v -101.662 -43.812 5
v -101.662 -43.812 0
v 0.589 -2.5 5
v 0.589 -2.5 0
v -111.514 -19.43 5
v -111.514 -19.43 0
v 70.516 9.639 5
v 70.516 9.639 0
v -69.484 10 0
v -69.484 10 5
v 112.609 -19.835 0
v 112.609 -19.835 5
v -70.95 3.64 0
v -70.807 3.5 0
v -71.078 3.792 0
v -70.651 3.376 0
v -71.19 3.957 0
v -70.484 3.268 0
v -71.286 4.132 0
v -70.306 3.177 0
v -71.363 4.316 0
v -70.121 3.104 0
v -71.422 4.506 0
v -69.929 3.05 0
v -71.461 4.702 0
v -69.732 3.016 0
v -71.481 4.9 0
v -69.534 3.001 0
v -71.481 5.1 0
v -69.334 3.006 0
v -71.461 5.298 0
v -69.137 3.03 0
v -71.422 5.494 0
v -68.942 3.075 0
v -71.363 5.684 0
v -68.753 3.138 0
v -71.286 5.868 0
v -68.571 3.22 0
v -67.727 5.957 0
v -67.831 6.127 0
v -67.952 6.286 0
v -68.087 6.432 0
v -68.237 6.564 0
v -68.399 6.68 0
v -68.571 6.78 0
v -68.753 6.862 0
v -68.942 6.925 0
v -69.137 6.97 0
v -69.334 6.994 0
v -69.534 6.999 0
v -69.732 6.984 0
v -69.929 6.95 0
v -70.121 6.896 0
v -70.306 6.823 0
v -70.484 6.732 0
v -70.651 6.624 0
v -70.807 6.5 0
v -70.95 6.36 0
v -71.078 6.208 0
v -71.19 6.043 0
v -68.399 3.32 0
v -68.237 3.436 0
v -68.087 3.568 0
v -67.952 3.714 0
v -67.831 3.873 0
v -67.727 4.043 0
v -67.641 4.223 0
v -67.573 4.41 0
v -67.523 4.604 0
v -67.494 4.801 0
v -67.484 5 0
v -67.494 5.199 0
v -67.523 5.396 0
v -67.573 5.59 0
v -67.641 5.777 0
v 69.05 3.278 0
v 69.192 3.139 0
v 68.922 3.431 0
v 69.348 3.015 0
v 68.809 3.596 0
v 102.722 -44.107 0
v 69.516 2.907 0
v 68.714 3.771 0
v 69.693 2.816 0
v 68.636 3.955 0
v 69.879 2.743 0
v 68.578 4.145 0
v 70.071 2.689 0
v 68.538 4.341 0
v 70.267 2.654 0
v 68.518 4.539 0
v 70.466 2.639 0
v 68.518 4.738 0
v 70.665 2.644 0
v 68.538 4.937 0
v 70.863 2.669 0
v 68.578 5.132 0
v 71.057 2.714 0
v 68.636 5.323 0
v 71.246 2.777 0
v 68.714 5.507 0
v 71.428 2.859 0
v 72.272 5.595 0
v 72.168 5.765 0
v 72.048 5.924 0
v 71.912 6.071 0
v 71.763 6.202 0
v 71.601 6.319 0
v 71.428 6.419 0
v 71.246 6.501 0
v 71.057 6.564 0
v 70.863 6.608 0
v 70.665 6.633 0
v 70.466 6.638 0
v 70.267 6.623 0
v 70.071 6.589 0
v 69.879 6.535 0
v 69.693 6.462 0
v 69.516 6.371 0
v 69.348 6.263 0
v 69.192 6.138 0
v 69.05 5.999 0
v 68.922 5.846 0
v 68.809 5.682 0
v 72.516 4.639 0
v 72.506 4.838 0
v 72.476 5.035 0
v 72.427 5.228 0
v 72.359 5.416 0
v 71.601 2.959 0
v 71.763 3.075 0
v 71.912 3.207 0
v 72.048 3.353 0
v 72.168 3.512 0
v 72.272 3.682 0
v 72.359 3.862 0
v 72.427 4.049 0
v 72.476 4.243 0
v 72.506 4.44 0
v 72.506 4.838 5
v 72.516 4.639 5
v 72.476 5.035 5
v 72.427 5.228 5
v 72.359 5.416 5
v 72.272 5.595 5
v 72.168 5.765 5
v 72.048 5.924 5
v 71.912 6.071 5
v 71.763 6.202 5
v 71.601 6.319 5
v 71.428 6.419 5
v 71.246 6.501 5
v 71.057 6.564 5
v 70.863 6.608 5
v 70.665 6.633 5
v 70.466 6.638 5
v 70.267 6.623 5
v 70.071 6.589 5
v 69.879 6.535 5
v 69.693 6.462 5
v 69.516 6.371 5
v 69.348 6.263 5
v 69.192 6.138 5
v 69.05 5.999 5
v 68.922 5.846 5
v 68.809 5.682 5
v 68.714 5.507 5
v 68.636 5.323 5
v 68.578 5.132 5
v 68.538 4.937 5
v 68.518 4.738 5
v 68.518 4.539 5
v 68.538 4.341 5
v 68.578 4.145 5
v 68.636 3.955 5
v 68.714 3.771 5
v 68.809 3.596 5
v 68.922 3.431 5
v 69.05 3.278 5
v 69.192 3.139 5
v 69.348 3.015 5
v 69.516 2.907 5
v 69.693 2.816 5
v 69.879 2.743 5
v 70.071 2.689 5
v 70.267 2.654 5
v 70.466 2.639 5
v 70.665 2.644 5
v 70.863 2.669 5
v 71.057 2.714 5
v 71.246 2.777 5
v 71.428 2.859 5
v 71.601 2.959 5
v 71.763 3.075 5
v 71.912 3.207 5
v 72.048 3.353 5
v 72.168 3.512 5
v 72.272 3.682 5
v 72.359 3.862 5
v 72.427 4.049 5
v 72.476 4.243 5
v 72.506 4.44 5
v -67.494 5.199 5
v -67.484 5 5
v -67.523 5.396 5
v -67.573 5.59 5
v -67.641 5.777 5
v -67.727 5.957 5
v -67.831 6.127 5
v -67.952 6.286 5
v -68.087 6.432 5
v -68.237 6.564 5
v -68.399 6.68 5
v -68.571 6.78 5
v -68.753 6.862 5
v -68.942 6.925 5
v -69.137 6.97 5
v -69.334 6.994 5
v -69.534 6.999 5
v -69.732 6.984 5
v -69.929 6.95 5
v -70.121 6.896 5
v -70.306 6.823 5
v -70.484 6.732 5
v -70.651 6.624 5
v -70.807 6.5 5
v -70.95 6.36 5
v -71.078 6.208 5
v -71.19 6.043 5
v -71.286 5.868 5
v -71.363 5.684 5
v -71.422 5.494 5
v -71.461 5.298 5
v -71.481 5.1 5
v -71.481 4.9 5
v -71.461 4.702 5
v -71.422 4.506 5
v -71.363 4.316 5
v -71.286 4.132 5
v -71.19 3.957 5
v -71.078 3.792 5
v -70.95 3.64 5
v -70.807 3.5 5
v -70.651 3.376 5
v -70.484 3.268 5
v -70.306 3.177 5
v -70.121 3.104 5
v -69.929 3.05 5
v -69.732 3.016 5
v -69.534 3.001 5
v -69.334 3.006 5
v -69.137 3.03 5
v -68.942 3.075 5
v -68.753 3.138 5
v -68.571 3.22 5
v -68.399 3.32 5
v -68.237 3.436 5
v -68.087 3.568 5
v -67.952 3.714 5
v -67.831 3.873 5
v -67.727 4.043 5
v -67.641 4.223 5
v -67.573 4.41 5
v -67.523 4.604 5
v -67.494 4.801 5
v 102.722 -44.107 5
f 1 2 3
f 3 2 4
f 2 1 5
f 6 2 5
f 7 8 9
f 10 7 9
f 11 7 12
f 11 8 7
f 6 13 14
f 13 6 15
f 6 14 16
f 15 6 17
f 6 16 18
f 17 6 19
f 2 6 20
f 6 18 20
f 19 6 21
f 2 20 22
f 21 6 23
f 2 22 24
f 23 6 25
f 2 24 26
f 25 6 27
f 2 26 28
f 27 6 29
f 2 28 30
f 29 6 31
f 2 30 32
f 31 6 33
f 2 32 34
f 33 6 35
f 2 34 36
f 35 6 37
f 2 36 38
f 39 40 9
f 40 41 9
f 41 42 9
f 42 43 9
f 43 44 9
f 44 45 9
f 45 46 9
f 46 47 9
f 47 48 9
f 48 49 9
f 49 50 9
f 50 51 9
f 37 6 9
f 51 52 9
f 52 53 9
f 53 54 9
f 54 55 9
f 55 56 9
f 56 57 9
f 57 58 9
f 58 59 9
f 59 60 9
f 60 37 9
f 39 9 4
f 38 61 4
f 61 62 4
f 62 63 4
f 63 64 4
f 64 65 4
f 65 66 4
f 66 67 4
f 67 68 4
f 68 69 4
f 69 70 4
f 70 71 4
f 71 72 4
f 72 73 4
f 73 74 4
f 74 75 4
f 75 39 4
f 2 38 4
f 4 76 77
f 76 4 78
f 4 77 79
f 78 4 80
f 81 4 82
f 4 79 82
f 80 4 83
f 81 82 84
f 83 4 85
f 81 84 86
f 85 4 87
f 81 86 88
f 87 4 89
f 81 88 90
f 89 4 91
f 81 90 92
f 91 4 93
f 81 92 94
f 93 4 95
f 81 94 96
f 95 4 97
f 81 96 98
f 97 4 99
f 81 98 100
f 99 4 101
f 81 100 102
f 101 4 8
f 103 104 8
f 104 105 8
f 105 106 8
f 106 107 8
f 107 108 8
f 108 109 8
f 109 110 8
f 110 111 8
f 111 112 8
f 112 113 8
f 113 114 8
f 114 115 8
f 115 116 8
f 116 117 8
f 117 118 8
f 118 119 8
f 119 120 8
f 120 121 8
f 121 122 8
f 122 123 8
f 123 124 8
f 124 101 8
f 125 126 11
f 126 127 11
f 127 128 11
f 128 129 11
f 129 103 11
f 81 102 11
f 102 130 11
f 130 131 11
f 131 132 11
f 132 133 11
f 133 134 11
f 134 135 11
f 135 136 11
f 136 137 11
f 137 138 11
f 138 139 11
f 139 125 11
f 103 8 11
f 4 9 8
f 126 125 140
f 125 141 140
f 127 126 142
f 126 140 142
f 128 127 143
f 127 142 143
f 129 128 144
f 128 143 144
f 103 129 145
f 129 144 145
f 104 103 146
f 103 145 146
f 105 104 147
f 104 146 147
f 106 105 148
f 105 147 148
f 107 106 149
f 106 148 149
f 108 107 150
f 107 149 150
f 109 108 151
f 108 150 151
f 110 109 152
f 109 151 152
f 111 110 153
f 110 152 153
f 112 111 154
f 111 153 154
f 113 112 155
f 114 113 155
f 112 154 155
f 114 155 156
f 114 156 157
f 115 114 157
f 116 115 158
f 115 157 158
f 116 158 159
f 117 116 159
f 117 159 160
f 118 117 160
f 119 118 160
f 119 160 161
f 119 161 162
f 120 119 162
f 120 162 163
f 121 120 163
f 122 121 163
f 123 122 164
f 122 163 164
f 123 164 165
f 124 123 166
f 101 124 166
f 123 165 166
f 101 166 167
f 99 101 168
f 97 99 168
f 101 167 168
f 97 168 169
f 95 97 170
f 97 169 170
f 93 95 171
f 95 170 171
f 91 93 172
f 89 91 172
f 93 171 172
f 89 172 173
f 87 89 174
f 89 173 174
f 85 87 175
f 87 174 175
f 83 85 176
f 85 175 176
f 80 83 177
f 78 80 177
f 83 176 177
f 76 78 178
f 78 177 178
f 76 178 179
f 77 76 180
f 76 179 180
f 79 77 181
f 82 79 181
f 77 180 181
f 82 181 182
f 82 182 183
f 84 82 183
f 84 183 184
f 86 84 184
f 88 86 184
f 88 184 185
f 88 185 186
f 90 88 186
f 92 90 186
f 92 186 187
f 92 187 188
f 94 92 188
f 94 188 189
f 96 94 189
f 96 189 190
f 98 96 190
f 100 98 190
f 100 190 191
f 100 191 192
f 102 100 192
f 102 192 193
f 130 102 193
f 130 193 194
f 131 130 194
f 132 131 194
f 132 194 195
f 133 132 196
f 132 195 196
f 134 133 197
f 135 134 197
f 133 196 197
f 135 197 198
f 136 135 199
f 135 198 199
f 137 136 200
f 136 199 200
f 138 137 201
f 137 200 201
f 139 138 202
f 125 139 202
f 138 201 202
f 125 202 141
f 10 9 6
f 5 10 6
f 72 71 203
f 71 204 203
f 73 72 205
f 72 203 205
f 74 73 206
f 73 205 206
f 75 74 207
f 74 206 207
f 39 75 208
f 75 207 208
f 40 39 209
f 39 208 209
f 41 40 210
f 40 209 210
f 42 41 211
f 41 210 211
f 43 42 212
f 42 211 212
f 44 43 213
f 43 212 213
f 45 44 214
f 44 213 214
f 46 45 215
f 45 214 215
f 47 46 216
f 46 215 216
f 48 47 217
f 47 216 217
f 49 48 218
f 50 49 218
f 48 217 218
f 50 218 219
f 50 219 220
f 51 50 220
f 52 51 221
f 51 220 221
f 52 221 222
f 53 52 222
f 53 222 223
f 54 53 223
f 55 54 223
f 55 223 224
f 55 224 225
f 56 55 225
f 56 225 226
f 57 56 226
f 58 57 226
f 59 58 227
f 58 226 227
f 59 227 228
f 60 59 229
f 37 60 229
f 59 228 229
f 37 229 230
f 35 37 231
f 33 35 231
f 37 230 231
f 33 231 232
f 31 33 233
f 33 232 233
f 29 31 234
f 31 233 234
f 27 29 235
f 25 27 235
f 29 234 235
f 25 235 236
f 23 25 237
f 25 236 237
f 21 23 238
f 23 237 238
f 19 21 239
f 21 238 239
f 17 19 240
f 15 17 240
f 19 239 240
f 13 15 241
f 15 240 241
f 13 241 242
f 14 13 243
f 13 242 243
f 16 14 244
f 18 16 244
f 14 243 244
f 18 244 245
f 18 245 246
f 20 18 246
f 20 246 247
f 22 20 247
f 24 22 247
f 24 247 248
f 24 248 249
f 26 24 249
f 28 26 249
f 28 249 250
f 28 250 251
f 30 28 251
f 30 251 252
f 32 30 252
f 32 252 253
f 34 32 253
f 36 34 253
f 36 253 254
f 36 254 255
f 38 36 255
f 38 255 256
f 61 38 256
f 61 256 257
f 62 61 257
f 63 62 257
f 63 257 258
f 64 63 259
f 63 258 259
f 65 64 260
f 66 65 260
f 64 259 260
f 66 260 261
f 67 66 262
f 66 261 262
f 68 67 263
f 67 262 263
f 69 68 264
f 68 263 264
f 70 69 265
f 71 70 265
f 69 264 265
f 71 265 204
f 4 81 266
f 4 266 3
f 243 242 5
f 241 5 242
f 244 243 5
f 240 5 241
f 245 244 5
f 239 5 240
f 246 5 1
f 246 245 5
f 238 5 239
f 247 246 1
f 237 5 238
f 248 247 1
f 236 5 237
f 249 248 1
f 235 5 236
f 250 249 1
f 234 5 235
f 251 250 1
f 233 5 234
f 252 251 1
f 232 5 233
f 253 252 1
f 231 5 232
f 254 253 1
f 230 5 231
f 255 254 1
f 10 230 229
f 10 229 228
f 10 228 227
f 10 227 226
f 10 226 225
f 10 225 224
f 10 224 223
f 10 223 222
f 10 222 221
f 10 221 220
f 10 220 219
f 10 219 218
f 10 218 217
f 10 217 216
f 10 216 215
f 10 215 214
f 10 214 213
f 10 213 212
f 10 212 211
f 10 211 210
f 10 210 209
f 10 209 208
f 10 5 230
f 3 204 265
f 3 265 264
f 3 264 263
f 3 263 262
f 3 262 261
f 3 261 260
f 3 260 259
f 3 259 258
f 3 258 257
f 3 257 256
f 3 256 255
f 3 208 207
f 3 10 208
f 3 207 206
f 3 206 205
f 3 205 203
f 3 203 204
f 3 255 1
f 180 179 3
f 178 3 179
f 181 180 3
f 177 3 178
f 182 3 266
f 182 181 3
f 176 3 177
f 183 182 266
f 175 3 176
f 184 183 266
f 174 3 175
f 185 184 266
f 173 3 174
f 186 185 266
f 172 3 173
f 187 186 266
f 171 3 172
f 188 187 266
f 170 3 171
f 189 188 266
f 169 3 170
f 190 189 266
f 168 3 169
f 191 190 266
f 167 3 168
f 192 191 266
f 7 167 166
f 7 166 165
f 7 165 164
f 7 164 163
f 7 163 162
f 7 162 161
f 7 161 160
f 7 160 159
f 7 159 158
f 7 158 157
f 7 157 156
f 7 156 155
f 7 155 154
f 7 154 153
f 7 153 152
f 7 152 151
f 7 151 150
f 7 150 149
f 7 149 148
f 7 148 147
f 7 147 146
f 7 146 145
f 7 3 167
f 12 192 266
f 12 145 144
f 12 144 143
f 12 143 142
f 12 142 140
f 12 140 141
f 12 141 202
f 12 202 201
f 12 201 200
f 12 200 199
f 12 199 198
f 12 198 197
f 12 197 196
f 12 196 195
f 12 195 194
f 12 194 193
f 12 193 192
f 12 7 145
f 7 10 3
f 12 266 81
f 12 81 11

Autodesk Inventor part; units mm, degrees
ref_plane "YZ Plane" through (0, 0, 0) normal (1, 0, 0) x (0, 1, 0)
ref_plane "XZ Plane" through (0, 0, 0) normal (0, 1, 0) x (-1, 0, 0)
ref_plane "XY Plane" through (0, 0, 0) normal (0, 0, 1) x (1, 0, 0)
sketch "Náčrt1" plane through (0, 0, 0) normal (0, 0, 1) x (1, 0, 0)
  line L0 (70.5158, 9.6388) -> (-69.4838, 10)
  line L1 (70.5158, 9.6388) -> (137.3455, -37.1558)
  line L2 (70.5158, 9.6388) -> (152.0998, 9.6388) construction
  line L3 (137.3455, -37.1558) -> (125.874, -53.5389)
  line L4 (-69.4838, 10) -> (-136.3135, -36.7947)
  line L5 (-69.4838, 10) -> (12.1002, 10) construction
  line L6 (-136.3135, -36.7947) -> (-124.8419, -53.1777)
  line L7 (0.6215, 10) -> (0.5893, -2.5)
  line L8 (-124.8419, -53.1777) -> (0.5893, -2.5)
  line L9 (125.874, -53.5389) -> (0.5893, -2.5)
  point P0 (0, 0)
  dimension "d2" = 140
  dimension "d3" = 81.584
  dimension "d4" = 35
  dimension "d5" = 20
  dimension "d6" = 81.584
  dimension "d7" = 145
  dimension "d8" = 20
  dimension "d9" = 12.5
  dimension "d22" = 135.282
  dimension "d23" = 135.282
extrude "Vysunutí1" add sketch "Náčrt1" along normal blind 5
sketch "Náčrt2" plane through (0, 0, 5) normal (0, 0, 1) x (1, 0, 0)
  line L0 (-136.3135, -36.7947) -> (-124.8419, -53.1777) projected
  line L1 (-124.8419, -53.1777) -> (-101.6623, -43.8125)
  line L2 (-124.8419, -53.1777) -> (0.5893, -2.5) projected
  line L3 (-101.6623, -43.8125) -> (-111.5137, -19.4297)
  line L4 (-69.4838, 10) -> (-136.3135, -36.7947) projected
  line L5 (-136.3135, -36.7947) -> (-124.8419, -53.1777)
  line L6 (0.5893, -2.5) -> (125.874, -53.5389) projected
  line L7 (125.874, -53.5389) -> (102.7215, -44.1069)
  line L8 (102.7215, -44.1069) -> (112.6093, -19.8353)
  line L9 (137.3455, -37.1558) -> (70.5158, 9.6388) projected
  line L10 (137.3455, -37.1558) -> (112.6093, -19.8353)
  line L11 (125.874, -53.5389) -> (137.3455, -37.1558) projected
  line L12 (125.874, -53.5389) -> (137.3455, -37.1558)
  point P0 (0, 0)
  dimension "d12" = 25
  dimension "d13" = 25
extrude "Vysunutí2" cut sketch "Náčrt2" against normal blind 5
sketch "Náčrt5" plane through (0, 0, 5) normal (0, 0, 1) x (1, 0, 0)
  line L0 (70.5158, 9.6388) -> (-69.4838, 10) projected
  line L1 (-69.4838, 10) -> (-69.4838, 5)
  line L2 (-69.4838, 10) -> (-64.4838, 10) construction
  line L3 (112.6093, -19.8353) -> (70.5158, 9.6388) projected
  line L4 (70.5158, 9.6388) -> (70.5158, 4.6388)
  line L5 (70.5158, 9.6388) -> (75.5158, 9.6388) construction
  circle A0 centre (-69.4838, 5) radius 2
  circle A1 centre (70.5158, 4.6388) radius 2
  point P0 (0, 0)
  dimension "d24" = 5
  dimension "d25" = 90
  dimension "d26" = 5
  dimension "d27" = 90
  dimension "d28" = 4
  dimension "d29" = 4
extrude "Vysunutí4" cut sketch "Náčrt5" against normal blind 10
properties part number "zaver"
